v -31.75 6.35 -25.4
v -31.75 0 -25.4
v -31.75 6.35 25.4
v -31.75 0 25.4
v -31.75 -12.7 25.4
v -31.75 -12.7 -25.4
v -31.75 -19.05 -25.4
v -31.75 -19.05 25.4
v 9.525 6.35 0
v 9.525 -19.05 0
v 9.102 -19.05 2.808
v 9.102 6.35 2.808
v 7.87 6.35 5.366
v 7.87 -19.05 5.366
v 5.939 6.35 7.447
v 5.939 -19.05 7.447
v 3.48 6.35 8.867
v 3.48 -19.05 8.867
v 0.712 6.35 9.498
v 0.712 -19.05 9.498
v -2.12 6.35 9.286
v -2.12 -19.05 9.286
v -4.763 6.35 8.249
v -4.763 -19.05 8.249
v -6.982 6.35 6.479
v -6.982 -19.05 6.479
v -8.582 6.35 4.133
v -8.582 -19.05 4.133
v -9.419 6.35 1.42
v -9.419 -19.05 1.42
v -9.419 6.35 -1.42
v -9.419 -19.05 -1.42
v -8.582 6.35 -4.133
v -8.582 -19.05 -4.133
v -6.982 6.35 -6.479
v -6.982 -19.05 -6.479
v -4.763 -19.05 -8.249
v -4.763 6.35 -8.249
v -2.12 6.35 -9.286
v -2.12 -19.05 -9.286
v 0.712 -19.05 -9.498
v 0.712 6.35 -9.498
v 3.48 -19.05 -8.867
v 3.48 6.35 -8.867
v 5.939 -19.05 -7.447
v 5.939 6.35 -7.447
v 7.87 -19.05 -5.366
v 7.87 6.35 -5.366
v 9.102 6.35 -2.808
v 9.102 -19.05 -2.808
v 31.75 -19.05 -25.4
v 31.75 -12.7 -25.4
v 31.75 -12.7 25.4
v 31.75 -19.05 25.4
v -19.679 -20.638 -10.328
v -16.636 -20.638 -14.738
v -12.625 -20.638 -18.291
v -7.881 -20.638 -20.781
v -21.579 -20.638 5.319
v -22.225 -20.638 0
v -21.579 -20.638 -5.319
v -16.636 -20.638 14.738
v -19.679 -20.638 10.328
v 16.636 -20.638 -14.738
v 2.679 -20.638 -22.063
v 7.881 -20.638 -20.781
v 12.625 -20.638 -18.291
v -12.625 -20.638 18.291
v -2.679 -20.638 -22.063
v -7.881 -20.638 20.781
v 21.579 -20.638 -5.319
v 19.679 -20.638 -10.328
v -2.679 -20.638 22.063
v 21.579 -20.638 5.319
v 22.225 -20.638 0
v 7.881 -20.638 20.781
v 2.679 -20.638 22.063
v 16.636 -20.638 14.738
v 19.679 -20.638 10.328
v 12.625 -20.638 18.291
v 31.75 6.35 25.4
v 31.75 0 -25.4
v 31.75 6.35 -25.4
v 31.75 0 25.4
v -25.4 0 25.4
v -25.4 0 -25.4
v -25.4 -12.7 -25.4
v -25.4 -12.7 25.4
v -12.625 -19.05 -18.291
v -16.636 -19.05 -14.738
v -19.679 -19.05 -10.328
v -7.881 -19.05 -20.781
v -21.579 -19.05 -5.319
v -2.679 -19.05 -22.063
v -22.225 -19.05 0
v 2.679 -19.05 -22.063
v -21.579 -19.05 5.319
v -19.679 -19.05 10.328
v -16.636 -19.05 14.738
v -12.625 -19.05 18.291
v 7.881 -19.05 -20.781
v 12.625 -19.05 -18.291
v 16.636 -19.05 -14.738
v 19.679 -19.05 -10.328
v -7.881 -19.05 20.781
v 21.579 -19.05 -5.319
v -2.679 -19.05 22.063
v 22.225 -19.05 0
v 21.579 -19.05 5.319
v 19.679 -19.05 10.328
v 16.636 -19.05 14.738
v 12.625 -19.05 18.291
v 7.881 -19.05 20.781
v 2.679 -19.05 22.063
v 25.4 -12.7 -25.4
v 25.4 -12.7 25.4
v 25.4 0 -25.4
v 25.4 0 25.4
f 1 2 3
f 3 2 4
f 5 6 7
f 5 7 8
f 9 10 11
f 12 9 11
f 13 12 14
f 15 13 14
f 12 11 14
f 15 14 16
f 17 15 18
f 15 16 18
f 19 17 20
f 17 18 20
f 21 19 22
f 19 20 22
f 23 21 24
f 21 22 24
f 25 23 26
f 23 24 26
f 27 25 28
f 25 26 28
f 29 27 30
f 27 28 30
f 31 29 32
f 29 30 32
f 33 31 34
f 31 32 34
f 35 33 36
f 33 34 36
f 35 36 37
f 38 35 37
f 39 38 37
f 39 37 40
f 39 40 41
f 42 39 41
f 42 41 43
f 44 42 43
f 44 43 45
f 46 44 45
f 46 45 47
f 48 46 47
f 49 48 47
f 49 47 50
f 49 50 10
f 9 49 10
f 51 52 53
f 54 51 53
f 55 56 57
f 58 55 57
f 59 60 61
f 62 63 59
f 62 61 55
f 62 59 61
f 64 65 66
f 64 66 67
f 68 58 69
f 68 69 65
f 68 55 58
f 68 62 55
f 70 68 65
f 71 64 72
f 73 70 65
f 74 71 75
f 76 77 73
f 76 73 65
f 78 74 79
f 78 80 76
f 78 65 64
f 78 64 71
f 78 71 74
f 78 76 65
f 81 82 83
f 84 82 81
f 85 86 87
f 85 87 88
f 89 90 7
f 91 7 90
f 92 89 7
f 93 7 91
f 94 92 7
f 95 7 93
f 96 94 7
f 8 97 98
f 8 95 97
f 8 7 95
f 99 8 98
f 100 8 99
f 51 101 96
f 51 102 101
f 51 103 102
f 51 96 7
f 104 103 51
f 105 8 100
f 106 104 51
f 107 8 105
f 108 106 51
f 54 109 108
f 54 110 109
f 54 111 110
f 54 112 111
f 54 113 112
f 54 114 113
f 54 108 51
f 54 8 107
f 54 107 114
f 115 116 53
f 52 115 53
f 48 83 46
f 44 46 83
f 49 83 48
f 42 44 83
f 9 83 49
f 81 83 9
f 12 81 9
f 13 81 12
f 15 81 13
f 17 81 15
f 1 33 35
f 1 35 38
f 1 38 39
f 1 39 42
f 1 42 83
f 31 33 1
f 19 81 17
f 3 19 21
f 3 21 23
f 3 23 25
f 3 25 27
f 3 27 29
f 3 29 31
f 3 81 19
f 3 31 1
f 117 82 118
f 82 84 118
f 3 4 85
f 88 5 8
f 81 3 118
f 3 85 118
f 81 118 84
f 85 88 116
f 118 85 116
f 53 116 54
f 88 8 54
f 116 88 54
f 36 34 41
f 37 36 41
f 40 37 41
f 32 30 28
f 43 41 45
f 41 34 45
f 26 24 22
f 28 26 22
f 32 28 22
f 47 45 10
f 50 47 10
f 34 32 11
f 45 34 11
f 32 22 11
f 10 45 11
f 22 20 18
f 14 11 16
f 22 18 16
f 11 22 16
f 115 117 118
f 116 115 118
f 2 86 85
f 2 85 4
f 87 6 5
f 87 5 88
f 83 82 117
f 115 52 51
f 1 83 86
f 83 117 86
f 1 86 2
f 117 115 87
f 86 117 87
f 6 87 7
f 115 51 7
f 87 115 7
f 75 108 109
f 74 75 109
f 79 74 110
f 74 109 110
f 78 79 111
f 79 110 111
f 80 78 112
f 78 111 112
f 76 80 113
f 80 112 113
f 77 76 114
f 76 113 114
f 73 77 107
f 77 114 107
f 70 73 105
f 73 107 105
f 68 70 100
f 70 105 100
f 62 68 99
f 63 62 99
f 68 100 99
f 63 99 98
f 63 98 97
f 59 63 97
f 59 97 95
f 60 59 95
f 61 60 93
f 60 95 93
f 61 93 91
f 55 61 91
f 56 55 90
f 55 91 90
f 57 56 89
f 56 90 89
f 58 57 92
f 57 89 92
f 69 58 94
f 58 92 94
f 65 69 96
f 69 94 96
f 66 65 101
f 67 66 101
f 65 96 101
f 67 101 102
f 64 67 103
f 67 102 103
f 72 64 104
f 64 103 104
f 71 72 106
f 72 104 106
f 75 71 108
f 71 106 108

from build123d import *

# Parameters (mm, degrees)
F0_W     = 50.8
F0_H     = 50.8
F1_DEPTH = 12.7
F2_W     = 6.35
F2_H     = 50.8
F2_W_2   = 50.8
F3_DEPTH = 6.35
F4_W     = 6.35
F4_H     = 50.8
F4_W_2   = 50.8
F5_DEPTH = 6.35
F6_R     = 9.525
F7_DEPTH = 38.1
F8_R     = 22.225
F8_R_2   = 9.525
F9_DEPTH = 1.5875


# Not quite as in the source:
# - a feature names something its author has since deleted; it is built from what else it names


with BuildPart() as f1:
    # F0 (on Front) → F1 (new body)
    with BuildSketch(Plane.XZ):
        Rectangle(F0_W, F0_H)
    extrude(amount=F1_DEPTH)

    # F2 (on face) → F3 (join)
    with BuildSketch(Plane.XZ.offset(12.7)):
        with Locations((-28.575, 0)):
            Rectangle(F2_W, F2_H)
        Rectangle(F2_W_2, F2_H)
        with Locations((28.575, 0)):
            Rectangle(F2_W, F2_H)
    extrude(amount=F3_DEPTH)

    # F4 (on face) → F5 (join)
    with BuildSketch(Plane(origin=(0, 0, 0), x_dir=(-1, 0, 0), z_dir=(0, 1, 0))):
        with Locations((28.575, 0)):
            Rectangle(F4_W, F4_H)
        Rectangle(F4_W_2, F4_H)
        with Locations((-28.575, 0)):
            Rectangle(F4_W, F4_H)
    extrude(amount=F5_DEPTH)

    # F6 (on face) → F7 (cut)
    with BuildSketch(Plane.XZ.offset(19.05)):
        Circle(F6_R)
    extrude(amount=-F7_DEPTH, mode=Mode.SUBTRACT)

    # F8 (on face) → F9 (join)
    with BuildSketch(Plane.XZ.offset(19.05)):
        Circle(F8_R)
        Circle(F8_R_2, mode=Mode.SUBTRACT)
        Circle(F8_R_2)
    extrude(amount=F9_DEPTH)


solid = f1.part
